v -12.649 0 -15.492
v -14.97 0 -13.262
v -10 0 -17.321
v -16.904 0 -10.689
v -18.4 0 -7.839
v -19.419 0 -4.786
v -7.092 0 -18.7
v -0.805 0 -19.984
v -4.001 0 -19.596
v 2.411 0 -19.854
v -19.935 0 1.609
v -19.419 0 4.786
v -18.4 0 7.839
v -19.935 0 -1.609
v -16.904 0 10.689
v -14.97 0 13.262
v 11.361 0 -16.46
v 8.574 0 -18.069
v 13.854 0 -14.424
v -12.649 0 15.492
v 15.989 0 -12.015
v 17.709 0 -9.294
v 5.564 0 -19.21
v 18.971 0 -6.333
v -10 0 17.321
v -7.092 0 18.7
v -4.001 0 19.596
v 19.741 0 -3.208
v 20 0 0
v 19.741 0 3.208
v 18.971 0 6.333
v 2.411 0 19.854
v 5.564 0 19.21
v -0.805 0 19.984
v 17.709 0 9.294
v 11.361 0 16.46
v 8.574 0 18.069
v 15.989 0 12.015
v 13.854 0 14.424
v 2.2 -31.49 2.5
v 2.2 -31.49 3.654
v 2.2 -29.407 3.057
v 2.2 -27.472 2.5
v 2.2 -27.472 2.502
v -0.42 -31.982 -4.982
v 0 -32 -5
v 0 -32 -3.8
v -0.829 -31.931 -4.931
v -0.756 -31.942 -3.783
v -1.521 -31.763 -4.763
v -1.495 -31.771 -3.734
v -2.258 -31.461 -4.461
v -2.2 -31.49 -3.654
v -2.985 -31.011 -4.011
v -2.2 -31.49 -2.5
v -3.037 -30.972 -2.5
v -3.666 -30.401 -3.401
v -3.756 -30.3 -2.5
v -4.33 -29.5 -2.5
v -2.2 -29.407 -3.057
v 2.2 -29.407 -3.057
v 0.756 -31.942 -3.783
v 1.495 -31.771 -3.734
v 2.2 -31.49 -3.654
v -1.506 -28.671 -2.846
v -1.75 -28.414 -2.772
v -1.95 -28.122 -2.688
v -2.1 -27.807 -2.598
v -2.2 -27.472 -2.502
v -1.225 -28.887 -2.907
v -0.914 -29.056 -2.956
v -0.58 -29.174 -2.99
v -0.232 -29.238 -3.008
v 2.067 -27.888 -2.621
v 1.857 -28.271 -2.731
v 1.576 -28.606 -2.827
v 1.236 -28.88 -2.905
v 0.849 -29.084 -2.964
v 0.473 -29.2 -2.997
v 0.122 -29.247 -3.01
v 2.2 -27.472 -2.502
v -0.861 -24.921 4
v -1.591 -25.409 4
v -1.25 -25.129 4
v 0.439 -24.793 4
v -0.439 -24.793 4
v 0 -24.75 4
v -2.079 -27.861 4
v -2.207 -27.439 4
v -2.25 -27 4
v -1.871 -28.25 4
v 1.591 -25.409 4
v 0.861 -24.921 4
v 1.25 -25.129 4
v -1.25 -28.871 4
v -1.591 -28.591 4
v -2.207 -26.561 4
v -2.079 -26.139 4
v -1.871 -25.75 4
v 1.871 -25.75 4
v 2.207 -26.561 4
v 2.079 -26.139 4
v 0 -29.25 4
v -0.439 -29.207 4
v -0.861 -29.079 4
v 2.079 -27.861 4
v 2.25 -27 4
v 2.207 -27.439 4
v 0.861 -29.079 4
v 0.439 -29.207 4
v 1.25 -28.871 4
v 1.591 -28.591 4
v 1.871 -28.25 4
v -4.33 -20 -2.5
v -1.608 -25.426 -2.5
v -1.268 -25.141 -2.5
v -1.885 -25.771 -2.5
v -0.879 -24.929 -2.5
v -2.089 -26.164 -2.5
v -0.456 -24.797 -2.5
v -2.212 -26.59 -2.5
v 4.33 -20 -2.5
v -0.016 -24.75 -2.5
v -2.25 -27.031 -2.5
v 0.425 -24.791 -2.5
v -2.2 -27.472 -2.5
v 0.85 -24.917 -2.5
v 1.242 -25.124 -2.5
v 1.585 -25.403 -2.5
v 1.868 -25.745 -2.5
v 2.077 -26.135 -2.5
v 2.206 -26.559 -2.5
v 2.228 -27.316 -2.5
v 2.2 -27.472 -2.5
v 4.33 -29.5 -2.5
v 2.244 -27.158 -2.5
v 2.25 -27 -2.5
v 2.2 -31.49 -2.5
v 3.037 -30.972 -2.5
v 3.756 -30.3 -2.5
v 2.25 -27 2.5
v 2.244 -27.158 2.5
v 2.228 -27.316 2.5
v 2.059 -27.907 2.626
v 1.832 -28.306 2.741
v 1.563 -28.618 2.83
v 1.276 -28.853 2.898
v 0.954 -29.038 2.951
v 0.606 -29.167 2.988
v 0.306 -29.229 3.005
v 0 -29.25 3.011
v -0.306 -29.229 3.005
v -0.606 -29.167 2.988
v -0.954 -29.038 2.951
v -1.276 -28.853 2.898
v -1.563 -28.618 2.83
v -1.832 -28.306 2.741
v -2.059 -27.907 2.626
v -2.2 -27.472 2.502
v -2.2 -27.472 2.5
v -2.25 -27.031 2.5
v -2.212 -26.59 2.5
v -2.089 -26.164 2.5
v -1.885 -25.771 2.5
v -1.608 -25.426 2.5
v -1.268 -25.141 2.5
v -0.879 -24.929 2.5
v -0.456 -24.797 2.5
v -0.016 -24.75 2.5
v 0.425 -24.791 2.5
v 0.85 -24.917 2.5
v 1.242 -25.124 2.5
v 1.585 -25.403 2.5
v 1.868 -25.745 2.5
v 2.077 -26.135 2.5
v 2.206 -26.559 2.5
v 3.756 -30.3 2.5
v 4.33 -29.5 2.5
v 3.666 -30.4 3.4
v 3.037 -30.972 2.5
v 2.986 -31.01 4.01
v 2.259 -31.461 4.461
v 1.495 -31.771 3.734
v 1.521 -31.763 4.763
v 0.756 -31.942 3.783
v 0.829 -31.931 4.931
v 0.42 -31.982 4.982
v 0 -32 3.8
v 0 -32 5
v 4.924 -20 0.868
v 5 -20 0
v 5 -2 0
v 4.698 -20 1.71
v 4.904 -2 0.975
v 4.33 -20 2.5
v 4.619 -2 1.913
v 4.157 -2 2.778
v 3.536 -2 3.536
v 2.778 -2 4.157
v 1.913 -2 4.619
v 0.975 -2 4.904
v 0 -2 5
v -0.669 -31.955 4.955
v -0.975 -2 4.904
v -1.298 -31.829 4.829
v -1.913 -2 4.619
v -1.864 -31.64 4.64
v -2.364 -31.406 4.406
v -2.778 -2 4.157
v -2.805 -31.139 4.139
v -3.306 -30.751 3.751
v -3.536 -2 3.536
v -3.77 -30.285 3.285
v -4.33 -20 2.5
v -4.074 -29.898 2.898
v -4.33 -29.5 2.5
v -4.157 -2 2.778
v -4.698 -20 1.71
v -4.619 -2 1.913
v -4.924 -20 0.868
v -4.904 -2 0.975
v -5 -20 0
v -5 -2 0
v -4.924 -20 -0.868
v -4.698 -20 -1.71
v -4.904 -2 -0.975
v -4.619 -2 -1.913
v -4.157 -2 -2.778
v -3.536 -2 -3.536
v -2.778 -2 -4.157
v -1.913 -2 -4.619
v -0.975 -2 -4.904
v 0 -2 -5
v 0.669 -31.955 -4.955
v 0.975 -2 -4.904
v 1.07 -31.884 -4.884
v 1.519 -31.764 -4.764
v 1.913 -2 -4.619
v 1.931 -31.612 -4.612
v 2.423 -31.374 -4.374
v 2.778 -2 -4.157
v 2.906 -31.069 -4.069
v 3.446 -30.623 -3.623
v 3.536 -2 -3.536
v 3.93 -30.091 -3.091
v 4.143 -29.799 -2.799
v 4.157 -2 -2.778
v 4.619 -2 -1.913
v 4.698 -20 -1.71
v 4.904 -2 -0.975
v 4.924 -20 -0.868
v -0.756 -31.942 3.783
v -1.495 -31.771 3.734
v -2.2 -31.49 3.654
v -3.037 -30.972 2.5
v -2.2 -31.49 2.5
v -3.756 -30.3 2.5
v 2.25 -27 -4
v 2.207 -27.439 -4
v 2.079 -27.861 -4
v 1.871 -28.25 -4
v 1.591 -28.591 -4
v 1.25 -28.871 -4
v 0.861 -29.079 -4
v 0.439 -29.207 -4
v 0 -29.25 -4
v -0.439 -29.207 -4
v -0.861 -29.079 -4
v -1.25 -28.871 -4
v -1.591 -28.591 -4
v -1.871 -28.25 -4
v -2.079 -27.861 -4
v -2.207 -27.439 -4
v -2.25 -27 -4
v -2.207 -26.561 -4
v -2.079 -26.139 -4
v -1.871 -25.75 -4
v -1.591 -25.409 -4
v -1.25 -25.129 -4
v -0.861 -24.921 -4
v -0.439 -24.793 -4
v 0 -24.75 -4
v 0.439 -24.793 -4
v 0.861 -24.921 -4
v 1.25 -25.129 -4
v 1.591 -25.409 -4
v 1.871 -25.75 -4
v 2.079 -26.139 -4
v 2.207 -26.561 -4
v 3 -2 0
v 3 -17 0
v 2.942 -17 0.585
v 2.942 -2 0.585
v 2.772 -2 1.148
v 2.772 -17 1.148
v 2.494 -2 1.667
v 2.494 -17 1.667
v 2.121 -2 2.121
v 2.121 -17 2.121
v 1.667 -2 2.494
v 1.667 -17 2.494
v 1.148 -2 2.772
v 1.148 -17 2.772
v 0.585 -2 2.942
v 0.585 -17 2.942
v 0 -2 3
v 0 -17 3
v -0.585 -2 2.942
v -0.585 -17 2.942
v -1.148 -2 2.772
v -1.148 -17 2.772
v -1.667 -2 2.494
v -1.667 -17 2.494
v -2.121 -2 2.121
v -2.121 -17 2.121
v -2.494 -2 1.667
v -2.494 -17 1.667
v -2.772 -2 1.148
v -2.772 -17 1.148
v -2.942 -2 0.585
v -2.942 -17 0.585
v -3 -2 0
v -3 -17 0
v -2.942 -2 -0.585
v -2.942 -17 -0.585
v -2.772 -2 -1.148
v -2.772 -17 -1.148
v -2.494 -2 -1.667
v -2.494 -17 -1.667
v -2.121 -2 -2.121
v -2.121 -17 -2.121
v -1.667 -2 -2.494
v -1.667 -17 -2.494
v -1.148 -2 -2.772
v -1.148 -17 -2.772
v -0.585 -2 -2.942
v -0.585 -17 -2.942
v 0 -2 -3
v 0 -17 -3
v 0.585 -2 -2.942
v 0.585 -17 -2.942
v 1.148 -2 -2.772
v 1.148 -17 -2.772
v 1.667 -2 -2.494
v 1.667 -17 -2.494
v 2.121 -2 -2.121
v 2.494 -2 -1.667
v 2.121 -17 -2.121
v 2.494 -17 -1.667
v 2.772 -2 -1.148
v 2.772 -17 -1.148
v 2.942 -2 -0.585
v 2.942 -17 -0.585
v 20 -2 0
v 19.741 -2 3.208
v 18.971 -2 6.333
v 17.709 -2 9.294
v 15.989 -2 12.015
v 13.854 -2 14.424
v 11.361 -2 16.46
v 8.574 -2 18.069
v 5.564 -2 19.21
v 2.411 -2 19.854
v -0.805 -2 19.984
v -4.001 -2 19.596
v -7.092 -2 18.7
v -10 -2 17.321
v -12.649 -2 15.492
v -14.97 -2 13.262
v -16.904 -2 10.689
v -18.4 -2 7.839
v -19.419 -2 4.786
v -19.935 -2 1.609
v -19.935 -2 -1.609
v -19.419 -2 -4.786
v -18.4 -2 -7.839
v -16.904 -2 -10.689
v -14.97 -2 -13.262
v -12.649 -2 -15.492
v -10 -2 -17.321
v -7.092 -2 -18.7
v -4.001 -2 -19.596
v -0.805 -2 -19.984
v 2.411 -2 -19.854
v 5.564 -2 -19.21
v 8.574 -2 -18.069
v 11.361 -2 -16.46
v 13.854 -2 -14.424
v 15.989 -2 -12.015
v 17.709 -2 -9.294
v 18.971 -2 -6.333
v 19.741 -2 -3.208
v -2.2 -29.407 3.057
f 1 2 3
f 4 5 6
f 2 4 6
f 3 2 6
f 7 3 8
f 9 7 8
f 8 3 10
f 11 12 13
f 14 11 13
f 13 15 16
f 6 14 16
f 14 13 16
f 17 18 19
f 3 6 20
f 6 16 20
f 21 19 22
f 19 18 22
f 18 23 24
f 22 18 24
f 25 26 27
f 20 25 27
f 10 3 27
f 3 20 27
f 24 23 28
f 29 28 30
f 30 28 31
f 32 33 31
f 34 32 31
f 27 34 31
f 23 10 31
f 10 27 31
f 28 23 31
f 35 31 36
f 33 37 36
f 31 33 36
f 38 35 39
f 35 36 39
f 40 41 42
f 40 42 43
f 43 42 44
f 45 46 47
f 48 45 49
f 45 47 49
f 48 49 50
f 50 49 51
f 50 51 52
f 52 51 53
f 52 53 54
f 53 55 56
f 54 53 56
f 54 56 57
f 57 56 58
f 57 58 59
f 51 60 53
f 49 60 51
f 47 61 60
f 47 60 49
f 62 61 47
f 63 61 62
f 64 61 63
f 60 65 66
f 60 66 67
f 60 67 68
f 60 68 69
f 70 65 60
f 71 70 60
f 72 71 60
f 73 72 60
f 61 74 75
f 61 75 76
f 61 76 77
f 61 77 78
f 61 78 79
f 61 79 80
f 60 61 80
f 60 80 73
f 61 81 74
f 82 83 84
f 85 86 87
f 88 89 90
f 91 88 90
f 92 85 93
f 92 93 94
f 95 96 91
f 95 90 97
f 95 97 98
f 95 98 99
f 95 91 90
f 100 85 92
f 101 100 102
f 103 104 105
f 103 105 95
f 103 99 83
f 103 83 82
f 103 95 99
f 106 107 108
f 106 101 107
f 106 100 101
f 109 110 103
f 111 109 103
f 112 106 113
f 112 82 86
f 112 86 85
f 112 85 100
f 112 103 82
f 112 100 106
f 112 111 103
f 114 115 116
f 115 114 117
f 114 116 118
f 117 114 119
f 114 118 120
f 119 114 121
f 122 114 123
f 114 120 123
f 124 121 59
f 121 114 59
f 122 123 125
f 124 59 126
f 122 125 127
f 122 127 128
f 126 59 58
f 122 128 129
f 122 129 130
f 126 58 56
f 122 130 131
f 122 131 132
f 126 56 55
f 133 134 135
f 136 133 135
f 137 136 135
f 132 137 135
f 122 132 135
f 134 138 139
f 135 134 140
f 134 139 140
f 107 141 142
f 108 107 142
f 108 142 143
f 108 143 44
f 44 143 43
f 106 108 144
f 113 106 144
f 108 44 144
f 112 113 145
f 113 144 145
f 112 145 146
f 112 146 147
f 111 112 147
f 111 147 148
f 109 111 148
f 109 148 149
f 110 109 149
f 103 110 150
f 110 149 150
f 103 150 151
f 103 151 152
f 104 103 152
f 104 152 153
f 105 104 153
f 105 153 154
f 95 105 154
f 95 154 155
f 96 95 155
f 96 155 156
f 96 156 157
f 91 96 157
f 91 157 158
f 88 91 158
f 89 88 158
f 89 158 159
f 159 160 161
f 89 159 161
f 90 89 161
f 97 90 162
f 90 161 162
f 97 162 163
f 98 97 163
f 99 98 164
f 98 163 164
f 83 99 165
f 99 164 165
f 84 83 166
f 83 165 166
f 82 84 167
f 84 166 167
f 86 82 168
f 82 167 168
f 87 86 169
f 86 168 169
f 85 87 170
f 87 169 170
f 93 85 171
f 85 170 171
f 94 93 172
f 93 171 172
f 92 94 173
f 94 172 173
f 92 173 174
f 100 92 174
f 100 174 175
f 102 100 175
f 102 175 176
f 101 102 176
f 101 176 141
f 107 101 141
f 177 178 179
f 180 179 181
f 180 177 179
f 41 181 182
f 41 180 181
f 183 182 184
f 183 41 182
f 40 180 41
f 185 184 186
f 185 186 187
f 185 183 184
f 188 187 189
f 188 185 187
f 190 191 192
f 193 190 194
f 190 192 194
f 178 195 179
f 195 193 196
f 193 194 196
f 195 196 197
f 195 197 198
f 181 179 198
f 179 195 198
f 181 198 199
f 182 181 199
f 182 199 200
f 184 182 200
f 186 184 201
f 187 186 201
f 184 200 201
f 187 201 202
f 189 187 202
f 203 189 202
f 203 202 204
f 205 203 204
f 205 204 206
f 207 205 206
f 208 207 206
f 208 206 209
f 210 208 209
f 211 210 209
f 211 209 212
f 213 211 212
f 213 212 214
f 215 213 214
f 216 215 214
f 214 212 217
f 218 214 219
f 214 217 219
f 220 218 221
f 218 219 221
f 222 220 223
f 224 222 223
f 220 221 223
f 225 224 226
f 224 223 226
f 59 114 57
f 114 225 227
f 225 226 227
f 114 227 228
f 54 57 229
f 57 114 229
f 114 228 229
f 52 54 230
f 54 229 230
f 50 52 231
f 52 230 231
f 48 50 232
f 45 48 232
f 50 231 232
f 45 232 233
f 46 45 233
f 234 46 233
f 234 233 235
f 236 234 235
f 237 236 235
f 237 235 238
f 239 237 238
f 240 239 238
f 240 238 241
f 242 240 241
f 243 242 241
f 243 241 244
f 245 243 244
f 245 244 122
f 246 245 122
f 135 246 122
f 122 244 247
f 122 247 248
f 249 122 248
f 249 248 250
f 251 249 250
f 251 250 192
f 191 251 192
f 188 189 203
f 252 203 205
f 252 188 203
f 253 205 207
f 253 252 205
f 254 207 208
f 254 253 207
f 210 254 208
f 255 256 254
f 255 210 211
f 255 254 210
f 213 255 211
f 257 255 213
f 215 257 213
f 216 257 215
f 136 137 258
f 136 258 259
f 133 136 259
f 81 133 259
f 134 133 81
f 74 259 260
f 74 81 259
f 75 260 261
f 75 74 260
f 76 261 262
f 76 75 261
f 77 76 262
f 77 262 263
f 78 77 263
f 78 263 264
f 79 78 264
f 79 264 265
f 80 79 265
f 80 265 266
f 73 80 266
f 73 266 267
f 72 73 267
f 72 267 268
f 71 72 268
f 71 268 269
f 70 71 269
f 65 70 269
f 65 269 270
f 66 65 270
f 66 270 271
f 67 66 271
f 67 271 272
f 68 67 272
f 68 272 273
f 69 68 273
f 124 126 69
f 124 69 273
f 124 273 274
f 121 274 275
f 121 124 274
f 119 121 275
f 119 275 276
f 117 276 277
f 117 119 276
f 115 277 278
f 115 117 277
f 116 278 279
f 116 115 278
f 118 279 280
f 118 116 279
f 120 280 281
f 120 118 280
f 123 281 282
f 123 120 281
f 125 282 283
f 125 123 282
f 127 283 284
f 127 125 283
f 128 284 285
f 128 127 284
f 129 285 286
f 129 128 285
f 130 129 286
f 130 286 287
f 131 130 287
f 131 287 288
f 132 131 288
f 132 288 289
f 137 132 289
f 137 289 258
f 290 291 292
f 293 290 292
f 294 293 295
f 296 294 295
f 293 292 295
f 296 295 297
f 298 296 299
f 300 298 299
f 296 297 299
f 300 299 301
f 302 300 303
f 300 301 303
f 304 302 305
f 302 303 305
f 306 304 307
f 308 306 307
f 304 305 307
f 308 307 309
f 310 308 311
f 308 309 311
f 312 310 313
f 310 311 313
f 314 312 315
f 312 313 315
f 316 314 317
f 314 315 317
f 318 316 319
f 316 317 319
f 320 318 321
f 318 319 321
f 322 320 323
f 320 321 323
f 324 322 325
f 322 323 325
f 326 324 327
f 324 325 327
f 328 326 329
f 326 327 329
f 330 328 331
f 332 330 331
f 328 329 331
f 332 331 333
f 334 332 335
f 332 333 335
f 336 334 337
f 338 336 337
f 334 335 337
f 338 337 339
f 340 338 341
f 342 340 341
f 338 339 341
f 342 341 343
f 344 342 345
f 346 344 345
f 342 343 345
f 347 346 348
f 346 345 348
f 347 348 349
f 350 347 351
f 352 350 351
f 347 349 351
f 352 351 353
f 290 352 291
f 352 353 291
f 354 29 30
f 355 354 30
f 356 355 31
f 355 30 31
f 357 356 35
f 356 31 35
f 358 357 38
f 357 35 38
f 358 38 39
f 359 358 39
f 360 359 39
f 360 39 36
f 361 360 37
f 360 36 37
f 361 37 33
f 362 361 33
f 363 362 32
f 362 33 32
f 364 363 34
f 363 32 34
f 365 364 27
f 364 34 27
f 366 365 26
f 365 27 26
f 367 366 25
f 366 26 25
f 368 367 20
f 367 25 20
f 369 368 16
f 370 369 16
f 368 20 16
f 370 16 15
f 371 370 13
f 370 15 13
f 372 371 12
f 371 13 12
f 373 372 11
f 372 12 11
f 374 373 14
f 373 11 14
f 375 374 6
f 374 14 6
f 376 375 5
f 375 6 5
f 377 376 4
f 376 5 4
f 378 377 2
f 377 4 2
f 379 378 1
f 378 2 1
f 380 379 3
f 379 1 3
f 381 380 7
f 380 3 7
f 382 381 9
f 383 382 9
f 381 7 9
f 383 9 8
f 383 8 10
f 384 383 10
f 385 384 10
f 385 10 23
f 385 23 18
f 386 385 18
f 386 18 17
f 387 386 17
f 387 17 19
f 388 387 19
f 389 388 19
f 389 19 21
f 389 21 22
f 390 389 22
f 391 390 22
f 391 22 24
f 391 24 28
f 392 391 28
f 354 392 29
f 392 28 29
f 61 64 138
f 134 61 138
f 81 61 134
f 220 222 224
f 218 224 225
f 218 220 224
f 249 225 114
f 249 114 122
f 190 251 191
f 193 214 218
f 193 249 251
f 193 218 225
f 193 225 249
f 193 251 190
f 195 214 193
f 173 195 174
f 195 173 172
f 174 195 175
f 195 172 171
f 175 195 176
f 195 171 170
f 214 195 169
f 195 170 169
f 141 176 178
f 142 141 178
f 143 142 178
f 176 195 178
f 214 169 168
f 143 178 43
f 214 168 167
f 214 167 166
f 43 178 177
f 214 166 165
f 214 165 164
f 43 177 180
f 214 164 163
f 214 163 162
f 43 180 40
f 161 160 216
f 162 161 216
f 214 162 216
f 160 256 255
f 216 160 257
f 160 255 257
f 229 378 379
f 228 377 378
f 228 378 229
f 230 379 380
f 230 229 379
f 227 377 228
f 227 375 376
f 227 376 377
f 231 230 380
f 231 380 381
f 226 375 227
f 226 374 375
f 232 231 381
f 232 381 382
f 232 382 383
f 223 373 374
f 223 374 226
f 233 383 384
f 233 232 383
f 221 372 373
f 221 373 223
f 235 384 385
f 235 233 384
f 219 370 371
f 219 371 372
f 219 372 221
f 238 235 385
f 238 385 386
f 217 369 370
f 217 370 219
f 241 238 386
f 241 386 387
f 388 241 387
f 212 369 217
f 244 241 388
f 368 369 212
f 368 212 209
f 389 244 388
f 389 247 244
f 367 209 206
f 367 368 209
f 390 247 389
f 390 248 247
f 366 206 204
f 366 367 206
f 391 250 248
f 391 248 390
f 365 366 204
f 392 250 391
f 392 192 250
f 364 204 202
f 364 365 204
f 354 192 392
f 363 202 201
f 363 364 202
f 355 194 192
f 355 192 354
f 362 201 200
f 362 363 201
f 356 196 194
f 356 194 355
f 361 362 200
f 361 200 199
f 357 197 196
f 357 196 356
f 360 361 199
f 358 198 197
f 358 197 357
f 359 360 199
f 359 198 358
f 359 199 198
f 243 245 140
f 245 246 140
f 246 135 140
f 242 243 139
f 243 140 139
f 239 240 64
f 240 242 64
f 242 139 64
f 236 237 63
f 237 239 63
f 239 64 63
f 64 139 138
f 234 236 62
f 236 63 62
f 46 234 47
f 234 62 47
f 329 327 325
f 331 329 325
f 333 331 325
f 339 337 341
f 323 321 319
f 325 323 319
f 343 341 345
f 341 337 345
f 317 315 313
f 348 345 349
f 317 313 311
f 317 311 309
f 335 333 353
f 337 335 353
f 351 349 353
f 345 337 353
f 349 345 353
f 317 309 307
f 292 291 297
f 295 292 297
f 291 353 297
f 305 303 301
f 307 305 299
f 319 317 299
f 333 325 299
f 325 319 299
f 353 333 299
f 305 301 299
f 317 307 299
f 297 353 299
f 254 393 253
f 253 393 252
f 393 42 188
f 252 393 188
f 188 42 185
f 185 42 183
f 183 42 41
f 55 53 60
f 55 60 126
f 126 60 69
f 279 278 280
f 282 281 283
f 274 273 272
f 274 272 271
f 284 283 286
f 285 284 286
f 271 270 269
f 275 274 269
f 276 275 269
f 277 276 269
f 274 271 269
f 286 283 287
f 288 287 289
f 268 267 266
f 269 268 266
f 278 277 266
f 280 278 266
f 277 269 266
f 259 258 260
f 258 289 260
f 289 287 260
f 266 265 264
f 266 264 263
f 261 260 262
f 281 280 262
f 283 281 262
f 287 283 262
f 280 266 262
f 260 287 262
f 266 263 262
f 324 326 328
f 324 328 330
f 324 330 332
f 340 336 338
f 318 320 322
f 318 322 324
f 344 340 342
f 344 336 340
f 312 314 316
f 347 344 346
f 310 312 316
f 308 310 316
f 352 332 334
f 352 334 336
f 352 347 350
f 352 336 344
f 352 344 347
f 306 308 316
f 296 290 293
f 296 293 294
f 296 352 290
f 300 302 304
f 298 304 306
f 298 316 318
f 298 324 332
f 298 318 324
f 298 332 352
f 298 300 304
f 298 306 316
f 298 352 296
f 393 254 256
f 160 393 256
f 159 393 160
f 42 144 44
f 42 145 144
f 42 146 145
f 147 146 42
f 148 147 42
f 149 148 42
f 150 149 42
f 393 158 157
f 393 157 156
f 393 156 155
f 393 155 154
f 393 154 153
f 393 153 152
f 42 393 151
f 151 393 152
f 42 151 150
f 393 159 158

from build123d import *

# Parameters (mm, degrees)
F0_R           = 20
F1_DEPTH       = 2
F2_R           = 5
F3_DEPTH       = 30
F6_DEPTH       = 12
F7_R           = 2.25
F8_DEPTH       = 1.5
F8_DEPTH_BACK  = 6.5
F10_DEPTH      = 17.501
F10_DEPTH_BACK = 22.501
F12_DEPTH      = 2.2
F12_DEPTH_BACK = 2.2
F15_R          = 3
F16_DEPTH      = 15


# Not quite as in the source:
# - a pattern or mirror of a feature is missing from the dataset's text; its kind, count and spacing are read off the source's solid


with BuildPart() as f1:
    # F0 (on Front) → F1 (new body)
    with BuildSketch(Plane.XZ):
        Circle(F0_R)
    extrude(amount=F1_DEPTH)

    # F2 (on face) → F3 (join)
    with BuildSketch(Plane.XZ.offset(2)):
        Circle(F2_R)
    extrude(amount=F3_DEPTH)

    # F5 (on face) → F6 (cut)
    with BuildSketch(Plane.XZ.offset(32)):
        with BuildLine():
            Line((4.3301270189, 2.5), (-4.3301270189, 2.5))
            ThreePointArc((-4.3301270189, 2.5), (-4.8296291314, 1.2940952255), (-5, 0))
            ThreePointArc((-5, 0), (-4.8296291314, -1.2940952255), (-4.3301270189, -2.5))
            Line((-4.3301270189, -2.5), (4.3301270189, -2.5))
            ThreePointArc((4.3301270189, -2.5), (4.8296291314, -1.2940952255), (5, 0))
            ThreePointArc((5, 0), (4.8296291314, 1.2940952255), (4.3301270189, 2.5))
        make_face()
    extrude(amount=-F6_DEPTH, mode=Mode.SUBTRACT)

    # F7 (on face) → F8 (cut, two sides)
    with BuildSketch(Plane(origin=(0, 0, 2.5), x_dir=(1, 0, 0), z_dir=(0, 0, -1))) as f8_sk:
        with Locations((0, 27)):
            Circle(F7_R)
    extrude(amount=-F8_DEPTH, mode=Mode.SUBTRACT)
    extrude(f8_sk.sketch, amount=F8_DEPTH_BACK, mode=Mode.SUBTRACT)

    # F9 (on face) → F10 (cut, two sides)
    with BuildSketch(Plane.XY.offset(-2.5)) as f10_sk:
        with BuildLine():
            Line((4.3301270189, -32), (4.3301270189, -29.5))
            ThreePointArc((4.3301270189, -29.5), (2.5, -31.3301270189), (0, -32))
            Line((0, -32), (4.3301270189, -32))
        make_face()
        with BuildLine():
            Line((-4.3301270189, -32), (0, -32))
            ThreePointArc((0, -32), (-2.5, -31.3301270189), (-4.3301270189, -29.5))
            Line((-4.3301270189, -29.5), (-4.3301270189, -32))
        make_face()
    extrude(amount=-F10_DEPTH, mode=Mode.SUBTRACT)
    extrude(f10_sk.sketch, amount=F10_DEPTH_BACK, mode=Mode.SUBTRACT)

    # F11 (on Right) → F12 (cut, two sides)
    with BuildSketch(Plane.YZ) as f12_sk:
        Polygon((-32, 2.5), (-29.5, 2.5), (-29.4072434941, 3.0565390355), (-32, 3.8), align=None)
        Polygon((-29.5, 2.5), (-27.466361223, 2.5), (-29.4072434941, 3.0565390355), align=None)
    f12 = extrude(amount=-F12_DEPTH, mode=Mode.SUBTRACT) + extrude(f12_sk.sketch, amount=F12_DEPTH_BACK, mode=Mode.SUBTRACT)

    # F12_copies: F12 across plane
    add(f12.mirror(Plane(origin=(0, 0, 0), x_dir=(-1, 0, 0), z_dir=(0, 0, -1))), mode=Mode.SUBTRACT)

    # F15 (on offset) → F16 (cut, through all)
    with BuildSketch(Plane.XZ.offset(17)):
        Circle(F15_R)
    extrude(amount=-F16_DEPTH, mode=Mode.SUBTRACT)


solid = f1.part
